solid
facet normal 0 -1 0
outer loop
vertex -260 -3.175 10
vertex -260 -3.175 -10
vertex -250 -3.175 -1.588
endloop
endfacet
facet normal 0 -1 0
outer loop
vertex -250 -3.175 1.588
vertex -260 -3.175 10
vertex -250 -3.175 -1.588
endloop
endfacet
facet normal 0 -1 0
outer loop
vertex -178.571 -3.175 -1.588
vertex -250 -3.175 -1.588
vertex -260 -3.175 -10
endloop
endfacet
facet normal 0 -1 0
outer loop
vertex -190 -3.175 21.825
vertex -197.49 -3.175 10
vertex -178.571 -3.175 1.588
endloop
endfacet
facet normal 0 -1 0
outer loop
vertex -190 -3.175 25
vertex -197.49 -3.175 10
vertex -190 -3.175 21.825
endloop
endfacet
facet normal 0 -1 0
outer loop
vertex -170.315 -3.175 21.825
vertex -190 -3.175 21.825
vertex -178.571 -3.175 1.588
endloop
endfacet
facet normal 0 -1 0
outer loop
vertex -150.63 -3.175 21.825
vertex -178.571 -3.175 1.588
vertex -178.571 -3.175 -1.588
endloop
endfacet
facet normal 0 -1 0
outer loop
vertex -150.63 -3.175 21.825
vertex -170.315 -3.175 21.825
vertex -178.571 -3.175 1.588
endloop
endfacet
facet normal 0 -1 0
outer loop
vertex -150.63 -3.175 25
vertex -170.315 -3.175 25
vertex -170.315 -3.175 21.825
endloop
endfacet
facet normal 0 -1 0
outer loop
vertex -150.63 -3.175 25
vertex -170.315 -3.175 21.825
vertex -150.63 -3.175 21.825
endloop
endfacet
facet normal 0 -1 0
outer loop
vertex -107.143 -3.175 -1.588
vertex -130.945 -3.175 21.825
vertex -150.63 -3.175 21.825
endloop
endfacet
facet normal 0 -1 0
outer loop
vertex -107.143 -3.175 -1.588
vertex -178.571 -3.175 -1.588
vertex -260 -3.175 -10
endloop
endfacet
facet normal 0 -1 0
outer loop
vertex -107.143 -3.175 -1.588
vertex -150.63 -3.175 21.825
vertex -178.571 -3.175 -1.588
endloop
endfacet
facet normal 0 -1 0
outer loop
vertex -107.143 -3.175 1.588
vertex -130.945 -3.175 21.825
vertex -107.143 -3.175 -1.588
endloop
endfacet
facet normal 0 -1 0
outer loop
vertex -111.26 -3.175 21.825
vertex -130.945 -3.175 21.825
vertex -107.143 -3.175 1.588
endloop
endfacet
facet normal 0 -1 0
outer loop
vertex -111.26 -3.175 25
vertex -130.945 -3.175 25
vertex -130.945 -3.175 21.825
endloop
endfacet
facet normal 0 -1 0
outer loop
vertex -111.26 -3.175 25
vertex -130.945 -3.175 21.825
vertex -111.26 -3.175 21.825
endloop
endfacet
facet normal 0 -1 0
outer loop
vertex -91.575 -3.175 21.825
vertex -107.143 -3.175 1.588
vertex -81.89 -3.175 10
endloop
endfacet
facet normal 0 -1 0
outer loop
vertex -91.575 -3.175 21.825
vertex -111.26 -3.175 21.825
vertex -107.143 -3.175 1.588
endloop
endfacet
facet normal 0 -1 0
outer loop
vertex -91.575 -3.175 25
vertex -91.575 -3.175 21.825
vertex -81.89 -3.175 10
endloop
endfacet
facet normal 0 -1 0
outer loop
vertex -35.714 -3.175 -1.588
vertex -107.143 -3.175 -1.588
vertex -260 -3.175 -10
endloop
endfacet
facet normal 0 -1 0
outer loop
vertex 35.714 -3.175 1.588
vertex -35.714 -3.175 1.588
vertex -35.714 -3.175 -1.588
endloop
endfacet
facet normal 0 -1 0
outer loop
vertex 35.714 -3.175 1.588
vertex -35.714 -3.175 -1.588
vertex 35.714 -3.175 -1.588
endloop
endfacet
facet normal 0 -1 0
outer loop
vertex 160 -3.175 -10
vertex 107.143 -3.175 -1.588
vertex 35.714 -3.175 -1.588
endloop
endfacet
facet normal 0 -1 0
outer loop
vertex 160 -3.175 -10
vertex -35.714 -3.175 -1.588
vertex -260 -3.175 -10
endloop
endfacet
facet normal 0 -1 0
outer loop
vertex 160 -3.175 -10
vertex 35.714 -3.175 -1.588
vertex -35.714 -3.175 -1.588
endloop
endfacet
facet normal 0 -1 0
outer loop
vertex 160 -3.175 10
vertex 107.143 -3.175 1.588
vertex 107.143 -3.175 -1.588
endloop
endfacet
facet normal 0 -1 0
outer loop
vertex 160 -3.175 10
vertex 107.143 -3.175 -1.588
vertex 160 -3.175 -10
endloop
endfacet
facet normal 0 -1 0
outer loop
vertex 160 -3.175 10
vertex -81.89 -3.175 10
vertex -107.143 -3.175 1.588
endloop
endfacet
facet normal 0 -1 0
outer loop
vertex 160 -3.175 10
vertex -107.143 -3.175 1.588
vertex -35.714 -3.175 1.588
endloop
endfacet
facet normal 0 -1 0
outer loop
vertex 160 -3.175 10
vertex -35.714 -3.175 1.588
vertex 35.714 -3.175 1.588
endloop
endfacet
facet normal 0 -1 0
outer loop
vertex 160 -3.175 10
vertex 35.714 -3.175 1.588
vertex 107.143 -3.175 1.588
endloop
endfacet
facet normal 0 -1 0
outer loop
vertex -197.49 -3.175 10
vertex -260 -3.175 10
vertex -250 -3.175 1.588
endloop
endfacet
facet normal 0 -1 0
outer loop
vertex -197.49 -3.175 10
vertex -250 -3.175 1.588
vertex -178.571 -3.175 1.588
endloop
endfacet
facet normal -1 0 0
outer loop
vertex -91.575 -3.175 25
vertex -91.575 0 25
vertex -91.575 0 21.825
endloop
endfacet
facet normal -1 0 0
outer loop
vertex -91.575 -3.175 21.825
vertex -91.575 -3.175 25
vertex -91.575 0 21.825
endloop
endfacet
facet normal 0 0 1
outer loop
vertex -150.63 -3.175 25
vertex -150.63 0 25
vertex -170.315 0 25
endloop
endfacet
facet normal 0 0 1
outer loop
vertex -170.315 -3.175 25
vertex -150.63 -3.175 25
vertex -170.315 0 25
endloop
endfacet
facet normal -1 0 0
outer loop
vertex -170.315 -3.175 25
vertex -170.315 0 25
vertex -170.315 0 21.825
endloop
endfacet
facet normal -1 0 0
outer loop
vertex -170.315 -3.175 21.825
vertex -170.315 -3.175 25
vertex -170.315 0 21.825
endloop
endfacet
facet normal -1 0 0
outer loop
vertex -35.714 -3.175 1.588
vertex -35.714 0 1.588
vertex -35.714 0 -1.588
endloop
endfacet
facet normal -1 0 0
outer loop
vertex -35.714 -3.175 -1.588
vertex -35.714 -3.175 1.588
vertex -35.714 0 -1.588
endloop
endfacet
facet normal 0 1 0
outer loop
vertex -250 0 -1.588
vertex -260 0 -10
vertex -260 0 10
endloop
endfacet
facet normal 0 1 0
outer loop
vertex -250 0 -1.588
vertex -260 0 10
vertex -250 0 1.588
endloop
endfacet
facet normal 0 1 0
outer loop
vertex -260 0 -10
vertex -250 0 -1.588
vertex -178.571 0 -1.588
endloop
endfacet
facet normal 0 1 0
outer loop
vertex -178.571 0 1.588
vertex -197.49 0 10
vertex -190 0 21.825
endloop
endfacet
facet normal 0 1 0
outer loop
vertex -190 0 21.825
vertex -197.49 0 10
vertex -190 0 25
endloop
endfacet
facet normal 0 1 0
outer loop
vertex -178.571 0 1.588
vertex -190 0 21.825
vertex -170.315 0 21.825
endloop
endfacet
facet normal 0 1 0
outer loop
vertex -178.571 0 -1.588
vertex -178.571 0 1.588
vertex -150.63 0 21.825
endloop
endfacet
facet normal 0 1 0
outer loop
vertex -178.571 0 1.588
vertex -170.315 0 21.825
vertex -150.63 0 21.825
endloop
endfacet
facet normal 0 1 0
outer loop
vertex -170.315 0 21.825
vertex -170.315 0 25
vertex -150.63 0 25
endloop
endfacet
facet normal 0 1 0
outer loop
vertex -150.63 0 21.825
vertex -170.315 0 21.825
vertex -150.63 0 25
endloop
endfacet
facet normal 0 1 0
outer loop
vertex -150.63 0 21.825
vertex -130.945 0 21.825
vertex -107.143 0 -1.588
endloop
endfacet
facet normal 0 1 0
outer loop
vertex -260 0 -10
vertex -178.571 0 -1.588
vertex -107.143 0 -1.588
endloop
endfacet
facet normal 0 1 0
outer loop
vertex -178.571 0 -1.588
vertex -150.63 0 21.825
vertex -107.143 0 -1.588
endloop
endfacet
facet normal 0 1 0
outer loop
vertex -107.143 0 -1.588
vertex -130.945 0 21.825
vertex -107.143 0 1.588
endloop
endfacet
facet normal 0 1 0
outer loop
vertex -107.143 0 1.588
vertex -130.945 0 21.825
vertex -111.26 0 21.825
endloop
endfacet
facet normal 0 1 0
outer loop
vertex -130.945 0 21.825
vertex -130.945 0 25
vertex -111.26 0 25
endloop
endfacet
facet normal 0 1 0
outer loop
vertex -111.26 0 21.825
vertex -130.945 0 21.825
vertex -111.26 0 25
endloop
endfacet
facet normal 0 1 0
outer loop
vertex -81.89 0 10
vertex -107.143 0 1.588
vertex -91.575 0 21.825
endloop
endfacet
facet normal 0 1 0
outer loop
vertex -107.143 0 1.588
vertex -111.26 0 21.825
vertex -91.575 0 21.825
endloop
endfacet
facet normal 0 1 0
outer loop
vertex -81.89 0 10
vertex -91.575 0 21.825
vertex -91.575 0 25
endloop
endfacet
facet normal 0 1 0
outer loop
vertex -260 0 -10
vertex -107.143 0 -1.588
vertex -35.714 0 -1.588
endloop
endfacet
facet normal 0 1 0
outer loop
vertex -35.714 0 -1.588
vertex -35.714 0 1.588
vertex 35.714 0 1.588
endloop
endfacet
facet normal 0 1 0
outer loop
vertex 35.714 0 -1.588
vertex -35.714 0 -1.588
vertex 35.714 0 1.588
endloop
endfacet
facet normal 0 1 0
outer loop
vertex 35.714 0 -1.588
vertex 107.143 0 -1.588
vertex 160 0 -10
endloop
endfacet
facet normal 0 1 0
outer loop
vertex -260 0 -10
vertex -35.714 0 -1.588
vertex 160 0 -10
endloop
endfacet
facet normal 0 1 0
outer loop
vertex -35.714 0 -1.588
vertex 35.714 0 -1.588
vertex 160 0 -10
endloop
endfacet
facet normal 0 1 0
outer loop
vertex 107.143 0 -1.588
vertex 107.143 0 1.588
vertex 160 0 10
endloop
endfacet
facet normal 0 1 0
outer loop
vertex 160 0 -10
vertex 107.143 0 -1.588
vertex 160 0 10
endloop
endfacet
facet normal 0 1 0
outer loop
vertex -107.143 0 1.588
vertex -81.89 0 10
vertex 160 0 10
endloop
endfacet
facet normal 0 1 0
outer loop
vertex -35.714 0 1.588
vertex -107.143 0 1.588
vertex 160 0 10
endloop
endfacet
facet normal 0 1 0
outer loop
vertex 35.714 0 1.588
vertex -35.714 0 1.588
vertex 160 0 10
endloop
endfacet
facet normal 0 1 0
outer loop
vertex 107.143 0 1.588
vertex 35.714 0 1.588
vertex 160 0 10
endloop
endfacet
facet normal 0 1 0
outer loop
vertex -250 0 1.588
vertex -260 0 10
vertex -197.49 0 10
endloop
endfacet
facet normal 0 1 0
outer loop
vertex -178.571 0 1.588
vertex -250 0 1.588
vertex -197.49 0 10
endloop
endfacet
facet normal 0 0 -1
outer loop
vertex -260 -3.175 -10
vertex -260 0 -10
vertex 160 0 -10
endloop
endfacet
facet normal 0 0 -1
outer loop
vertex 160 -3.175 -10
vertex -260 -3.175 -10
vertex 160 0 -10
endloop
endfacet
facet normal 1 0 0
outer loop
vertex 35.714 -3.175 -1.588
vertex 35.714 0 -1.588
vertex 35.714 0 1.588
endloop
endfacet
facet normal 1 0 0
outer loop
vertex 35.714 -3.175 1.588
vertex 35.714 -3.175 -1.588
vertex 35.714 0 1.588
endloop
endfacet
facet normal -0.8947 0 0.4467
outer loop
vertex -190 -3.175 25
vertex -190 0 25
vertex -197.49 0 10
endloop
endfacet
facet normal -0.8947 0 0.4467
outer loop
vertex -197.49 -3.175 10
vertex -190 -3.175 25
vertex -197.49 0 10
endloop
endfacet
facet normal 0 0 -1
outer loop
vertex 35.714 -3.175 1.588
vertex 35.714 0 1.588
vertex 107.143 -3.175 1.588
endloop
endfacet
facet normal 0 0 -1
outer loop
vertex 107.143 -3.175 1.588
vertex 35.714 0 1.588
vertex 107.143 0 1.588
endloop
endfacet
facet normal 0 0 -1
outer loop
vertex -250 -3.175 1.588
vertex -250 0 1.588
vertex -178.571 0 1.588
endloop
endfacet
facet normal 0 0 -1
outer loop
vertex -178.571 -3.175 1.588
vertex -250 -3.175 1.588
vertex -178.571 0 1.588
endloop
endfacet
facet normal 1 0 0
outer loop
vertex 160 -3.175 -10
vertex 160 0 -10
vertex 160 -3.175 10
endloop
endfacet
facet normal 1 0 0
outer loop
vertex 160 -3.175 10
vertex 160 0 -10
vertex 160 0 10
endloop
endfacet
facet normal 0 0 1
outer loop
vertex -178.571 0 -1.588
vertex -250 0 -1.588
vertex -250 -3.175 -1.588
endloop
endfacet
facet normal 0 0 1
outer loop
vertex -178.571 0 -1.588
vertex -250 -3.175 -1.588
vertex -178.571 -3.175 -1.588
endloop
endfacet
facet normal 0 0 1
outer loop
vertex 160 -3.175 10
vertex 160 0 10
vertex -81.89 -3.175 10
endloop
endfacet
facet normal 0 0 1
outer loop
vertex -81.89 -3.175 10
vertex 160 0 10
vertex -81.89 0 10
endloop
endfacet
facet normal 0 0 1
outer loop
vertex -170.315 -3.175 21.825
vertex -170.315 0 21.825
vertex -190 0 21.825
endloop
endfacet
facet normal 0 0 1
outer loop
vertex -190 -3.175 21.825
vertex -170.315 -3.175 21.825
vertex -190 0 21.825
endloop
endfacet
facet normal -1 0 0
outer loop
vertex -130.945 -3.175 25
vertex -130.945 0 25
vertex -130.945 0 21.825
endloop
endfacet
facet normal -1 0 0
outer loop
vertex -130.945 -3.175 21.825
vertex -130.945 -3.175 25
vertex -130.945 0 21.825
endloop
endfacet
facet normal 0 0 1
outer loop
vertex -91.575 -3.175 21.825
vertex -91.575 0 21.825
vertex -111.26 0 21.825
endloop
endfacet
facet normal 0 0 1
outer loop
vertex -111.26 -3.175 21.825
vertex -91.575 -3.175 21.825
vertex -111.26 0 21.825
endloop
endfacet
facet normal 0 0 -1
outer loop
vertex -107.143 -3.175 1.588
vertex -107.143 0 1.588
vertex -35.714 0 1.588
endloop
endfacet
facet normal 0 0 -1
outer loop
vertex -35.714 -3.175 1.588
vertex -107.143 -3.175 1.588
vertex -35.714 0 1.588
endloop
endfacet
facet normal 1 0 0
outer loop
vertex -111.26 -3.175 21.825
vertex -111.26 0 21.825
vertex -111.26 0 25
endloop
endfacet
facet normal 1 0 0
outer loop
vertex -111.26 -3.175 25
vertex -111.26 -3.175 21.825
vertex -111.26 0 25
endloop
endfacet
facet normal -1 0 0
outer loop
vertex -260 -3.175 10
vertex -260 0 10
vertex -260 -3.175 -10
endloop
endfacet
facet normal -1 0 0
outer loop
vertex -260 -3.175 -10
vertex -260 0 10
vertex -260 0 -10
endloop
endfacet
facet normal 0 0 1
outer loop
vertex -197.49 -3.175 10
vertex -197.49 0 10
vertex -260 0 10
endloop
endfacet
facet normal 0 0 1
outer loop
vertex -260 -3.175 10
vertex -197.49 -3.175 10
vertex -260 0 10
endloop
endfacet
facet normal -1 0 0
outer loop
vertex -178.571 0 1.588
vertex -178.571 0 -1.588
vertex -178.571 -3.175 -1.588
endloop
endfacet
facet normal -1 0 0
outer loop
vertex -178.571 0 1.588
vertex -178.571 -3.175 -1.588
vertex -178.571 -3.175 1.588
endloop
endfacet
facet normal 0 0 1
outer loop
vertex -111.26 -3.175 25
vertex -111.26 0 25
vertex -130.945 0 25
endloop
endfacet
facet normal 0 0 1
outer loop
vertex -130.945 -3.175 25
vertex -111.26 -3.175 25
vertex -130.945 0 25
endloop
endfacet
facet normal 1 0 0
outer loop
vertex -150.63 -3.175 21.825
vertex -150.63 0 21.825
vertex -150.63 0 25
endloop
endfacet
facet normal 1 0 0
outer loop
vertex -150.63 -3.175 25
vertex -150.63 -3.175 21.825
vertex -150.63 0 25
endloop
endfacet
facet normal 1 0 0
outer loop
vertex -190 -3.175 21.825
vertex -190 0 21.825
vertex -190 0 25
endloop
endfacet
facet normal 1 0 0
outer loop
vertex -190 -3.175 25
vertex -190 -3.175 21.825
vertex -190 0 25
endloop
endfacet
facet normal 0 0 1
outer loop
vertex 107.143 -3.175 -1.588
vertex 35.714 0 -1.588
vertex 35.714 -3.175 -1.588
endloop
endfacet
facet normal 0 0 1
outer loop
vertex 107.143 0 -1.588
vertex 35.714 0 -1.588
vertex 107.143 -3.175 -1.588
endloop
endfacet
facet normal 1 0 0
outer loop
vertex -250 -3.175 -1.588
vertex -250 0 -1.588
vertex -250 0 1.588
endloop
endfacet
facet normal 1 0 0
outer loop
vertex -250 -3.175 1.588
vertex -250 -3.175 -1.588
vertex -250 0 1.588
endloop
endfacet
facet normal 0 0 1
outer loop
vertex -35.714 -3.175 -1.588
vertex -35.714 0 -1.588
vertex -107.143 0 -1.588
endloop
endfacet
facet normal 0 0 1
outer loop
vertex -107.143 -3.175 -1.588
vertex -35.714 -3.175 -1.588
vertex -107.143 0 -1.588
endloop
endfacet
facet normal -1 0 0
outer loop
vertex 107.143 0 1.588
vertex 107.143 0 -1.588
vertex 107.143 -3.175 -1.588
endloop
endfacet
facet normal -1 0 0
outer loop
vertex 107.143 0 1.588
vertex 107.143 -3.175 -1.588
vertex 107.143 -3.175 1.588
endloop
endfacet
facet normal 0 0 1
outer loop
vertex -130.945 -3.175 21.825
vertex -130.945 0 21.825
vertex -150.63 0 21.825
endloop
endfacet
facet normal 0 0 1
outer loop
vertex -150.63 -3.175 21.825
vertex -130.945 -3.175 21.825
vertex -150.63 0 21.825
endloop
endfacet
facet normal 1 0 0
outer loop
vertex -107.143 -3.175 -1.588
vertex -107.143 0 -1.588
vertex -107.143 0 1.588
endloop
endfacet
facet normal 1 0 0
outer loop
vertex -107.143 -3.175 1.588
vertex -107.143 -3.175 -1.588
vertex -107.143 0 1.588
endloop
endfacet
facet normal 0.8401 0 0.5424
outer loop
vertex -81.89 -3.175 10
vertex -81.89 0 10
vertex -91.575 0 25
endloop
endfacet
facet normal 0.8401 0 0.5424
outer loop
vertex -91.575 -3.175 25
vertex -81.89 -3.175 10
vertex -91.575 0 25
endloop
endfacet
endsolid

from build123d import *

# Parameters (mm, degrees)
F0_W     = 71.4285714286
F0_H     = 3.175
F1_DEPTH = 3.175


# Not quite as in the source:
# - ends of sketch curves that miss each other by under 0.0002 mm in the source are joined


with BuildPart() as f1:
    # F0 (on Front) → F1 (new body)
    with BuildSketch(Plane.XZ):
        Polygon((-260, 10), (-260, -10), (160, -10), (160, 10), (-81.8902254105, 10), (-91.575, 10), (-190, 10), (-197.4899102798, 10), align=None)
        with Locations((-214.2857571429, 0)):
            Rectangle(F0_W, F0_H, mode=Mode.SUBTRACT)
        Polygon((-35.7142857143, 1.5875), (-35.7142857143, -1.5875), (-107.1428714286, -1.5875), (-107.1428857143, 1.5875), align=None, mode=Mode.SUBTRACT)
        with Locations((71.4285857143, 0)):
            Rectangle(F0_W, F0_H, mode=Mode.SUBTRACT)
        Polygon((-190, 25), (-197.4899102798, 10), (-190, 10), (-190, 21.825), align=None)
        Polygon((-190, 21.825), (-190, 10), (-91.575, 10), (-91.575, 21.825), (-111.26, 21.825), (-111.26, 25), (-130.945, 25), (-130.945, 21.825), (-150.63, 21.825), (-150.63, 25), (-170.315, 25), (-170.315, 21.825), align=None)
        Polygon((-91.575, 10), (-81.8902254105, 10), (-91.575, 25), (-91.575, 21.825), align=None)
    extrude(amount=F1_DEPTH)


solid = f1.part
